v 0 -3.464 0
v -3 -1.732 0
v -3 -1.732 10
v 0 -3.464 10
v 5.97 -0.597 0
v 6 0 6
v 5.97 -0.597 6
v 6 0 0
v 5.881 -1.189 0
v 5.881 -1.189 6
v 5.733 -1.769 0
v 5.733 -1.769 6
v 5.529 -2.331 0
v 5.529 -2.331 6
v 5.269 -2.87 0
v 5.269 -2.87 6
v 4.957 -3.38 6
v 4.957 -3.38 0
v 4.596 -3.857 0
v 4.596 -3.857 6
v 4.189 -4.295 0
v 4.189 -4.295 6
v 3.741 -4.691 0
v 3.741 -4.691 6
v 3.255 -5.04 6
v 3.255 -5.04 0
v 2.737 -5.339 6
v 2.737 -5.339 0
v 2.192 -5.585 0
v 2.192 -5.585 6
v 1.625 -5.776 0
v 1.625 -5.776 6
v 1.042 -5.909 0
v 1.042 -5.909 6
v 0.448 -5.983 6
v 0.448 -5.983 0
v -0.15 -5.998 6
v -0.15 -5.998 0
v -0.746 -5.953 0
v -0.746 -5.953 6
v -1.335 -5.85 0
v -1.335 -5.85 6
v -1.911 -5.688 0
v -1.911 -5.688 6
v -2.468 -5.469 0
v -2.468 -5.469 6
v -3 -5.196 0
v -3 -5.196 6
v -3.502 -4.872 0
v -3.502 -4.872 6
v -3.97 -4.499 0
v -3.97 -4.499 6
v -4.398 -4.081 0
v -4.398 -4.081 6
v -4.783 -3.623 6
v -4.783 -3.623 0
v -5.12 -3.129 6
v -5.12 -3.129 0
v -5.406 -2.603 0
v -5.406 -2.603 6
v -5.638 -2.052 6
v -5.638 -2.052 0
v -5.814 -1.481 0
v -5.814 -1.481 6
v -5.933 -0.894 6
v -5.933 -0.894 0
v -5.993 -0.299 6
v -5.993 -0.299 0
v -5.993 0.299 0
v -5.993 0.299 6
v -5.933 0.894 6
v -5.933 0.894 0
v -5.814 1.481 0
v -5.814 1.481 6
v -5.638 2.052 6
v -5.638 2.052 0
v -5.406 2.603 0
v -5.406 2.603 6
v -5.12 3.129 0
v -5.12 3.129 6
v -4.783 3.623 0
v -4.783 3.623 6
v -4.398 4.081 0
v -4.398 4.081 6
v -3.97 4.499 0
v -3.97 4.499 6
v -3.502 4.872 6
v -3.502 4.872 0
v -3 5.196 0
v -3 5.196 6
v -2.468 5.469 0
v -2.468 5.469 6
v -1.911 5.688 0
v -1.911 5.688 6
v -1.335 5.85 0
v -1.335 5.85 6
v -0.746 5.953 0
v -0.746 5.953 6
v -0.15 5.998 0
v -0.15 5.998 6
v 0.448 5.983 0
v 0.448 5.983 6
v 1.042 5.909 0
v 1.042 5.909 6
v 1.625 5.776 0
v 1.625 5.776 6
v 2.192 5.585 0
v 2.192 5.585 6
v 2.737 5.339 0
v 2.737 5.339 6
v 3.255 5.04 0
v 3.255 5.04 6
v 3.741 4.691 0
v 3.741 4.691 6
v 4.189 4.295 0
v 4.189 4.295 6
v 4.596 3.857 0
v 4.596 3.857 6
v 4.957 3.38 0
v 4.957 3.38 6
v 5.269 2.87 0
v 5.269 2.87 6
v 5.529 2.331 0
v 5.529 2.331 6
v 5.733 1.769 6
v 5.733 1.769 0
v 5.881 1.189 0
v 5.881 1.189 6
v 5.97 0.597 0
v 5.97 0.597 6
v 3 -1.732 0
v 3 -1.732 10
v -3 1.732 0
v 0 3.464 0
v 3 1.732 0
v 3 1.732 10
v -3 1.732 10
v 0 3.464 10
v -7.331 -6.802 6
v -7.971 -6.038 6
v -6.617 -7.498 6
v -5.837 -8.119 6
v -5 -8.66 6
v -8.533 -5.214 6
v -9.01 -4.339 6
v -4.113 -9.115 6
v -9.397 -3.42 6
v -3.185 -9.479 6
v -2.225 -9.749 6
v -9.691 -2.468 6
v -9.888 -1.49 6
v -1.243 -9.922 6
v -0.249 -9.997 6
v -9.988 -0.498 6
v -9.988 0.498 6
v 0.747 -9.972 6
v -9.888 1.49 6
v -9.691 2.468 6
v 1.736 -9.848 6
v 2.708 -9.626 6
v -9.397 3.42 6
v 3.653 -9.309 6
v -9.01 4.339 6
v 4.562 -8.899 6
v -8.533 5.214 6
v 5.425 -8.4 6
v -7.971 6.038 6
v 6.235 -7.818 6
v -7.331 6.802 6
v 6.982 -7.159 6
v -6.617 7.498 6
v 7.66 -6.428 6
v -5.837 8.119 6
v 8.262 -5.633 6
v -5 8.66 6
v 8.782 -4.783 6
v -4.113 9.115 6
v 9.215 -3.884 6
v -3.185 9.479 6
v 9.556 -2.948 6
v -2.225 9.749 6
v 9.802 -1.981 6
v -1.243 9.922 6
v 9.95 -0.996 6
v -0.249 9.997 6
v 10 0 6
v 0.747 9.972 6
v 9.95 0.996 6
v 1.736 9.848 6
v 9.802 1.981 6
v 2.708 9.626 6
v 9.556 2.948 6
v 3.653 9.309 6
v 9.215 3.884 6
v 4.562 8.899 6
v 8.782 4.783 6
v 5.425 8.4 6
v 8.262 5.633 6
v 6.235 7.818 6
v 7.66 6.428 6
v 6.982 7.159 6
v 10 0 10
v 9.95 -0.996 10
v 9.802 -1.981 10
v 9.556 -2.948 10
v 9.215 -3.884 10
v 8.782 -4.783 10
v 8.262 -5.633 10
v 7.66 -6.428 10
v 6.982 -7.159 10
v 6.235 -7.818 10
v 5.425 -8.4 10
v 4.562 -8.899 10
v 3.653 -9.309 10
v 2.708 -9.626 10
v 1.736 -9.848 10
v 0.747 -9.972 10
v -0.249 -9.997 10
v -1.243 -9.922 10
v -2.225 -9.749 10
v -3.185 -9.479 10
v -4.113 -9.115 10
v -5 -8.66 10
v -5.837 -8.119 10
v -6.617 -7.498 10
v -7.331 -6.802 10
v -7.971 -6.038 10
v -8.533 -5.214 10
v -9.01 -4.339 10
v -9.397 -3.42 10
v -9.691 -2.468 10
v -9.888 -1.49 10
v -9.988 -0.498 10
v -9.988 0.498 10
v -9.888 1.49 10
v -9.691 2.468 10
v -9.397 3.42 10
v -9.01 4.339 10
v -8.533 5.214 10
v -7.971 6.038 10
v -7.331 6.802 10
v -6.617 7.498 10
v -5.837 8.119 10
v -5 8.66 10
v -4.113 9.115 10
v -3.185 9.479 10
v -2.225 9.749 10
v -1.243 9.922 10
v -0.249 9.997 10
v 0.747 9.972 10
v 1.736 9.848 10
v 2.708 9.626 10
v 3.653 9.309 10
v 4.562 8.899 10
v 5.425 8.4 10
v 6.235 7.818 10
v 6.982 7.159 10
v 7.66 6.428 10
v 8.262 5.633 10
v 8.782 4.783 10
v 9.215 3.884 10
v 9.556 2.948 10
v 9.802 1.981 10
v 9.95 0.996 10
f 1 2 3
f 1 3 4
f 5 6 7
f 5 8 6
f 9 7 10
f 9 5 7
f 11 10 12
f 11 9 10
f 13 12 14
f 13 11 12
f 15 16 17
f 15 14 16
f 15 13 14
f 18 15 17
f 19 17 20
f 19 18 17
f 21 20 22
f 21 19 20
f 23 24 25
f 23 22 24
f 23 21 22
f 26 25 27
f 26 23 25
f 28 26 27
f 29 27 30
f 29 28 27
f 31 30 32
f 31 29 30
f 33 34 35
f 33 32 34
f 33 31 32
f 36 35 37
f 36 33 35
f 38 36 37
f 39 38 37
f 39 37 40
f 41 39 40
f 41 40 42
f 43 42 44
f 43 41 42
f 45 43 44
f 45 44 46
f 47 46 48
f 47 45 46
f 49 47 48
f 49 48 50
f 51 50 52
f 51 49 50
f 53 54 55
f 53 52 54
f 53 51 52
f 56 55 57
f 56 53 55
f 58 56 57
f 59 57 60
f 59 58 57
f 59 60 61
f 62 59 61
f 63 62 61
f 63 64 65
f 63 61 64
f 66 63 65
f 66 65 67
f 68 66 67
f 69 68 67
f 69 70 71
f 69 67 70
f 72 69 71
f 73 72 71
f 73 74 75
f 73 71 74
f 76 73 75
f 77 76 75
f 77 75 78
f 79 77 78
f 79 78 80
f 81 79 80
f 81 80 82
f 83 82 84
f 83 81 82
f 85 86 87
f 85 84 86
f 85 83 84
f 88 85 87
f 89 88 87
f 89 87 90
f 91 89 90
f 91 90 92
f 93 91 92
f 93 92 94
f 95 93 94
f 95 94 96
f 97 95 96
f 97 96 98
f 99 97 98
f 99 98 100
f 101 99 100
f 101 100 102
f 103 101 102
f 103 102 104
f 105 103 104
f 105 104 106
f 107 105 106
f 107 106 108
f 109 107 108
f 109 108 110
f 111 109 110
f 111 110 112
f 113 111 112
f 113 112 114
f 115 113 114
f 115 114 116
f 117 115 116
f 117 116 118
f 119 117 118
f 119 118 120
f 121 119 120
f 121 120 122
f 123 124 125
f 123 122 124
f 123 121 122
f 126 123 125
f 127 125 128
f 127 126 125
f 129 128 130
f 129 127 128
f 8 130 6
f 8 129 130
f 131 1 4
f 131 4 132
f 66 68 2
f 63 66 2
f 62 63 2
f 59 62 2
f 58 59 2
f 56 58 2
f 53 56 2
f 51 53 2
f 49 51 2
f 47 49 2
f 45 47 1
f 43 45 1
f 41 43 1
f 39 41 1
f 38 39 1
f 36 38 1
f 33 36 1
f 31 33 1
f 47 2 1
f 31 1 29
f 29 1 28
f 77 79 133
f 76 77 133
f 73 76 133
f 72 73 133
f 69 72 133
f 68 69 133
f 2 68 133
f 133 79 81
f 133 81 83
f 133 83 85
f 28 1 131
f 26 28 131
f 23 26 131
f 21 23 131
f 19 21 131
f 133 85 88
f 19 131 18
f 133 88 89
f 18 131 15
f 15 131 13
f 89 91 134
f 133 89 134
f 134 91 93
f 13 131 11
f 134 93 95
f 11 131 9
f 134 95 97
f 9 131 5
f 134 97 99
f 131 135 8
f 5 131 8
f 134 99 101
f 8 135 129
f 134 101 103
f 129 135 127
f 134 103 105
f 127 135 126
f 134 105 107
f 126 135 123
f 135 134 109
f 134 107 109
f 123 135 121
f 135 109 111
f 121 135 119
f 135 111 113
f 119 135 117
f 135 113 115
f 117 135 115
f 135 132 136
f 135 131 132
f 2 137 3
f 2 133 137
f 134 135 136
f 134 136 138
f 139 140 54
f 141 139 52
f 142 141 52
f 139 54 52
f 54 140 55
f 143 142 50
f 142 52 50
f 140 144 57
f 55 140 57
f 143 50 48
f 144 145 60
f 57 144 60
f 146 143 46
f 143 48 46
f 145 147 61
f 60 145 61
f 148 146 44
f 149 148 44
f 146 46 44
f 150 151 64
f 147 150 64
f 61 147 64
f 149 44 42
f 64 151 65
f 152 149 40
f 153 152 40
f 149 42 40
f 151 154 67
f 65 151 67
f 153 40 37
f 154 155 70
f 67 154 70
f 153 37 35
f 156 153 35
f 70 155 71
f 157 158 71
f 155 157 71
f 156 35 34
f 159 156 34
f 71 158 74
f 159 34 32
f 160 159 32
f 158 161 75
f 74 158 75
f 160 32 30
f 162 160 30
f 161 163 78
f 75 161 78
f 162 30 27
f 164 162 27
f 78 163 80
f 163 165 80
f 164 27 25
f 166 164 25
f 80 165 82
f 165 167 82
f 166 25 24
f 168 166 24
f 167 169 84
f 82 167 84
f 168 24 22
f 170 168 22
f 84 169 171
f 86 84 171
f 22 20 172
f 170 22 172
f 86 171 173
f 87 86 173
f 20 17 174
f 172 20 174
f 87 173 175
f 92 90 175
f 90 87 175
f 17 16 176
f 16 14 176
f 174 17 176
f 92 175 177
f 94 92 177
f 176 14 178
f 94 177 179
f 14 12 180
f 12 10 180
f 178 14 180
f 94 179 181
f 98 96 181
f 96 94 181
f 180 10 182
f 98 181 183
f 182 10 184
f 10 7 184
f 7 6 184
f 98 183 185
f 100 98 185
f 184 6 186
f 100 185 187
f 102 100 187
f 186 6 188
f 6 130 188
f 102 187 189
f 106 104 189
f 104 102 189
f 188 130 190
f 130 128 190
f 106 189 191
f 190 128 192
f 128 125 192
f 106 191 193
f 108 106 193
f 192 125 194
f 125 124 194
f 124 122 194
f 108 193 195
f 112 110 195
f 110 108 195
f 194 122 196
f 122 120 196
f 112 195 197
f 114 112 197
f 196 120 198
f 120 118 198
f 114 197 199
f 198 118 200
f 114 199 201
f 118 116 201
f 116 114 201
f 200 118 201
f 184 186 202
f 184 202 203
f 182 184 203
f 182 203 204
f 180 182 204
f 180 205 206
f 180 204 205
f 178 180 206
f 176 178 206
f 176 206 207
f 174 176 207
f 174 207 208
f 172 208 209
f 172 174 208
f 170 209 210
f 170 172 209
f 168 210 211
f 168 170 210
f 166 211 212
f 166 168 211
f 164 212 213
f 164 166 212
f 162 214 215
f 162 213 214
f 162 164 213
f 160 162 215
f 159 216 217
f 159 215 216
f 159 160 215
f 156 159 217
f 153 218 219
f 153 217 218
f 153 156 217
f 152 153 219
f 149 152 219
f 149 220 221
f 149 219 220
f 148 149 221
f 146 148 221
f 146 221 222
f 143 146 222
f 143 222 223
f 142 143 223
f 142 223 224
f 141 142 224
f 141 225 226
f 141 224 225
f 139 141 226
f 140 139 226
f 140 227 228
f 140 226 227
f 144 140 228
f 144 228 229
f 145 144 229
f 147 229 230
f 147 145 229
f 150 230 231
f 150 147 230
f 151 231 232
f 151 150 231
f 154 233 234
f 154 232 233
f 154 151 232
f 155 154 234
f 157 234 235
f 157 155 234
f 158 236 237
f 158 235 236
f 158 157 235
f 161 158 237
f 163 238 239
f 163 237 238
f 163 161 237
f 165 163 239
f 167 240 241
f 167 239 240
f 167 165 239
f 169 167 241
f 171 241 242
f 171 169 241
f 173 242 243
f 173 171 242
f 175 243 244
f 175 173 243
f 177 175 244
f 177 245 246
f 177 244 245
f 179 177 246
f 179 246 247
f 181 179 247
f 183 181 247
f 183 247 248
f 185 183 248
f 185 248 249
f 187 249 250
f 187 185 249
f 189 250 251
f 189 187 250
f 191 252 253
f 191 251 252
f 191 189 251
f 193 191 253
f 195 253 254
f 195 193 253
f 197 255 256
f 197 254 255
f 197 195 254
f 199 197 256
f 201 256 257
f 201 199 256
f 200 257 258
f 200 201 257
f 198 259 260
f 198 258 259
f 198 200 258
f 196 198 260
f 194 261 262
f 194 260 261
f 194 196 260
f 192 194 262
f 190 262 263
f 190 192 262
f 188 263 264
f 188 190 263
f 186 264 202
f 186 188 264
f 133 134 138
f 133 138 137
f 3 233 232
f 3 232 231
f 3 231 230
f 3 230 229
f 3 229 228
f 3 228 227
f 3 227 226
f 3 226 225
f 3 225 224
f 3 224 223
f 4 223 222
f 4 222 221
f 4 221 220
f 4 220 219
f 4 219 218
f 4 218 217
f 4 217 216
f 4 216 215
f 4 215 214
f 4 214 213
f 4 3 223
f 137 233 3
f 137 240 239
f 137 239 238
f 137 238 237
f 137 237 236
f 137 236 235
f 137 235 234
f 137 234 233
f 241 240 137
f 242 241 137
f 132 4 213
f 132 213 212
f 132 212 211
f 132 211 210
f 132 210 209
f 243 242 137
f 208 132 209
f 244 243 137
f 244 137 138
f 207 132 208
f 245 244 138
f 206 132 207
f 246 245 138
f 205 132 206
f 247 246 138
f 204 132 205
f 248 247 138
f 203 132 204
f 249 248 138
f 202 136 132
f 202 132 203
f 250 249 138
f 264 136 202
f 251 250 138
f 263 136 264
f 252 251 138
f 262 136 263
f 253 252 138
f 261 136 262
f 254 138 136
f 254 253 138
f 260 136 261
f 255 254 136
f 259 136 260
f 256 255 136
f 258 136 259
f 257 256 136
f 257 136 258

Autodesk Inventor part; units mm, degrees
ref_plane "YZ Plane" through (0, 0, 0) normal (1, 0, 0) x (0, 1, 0)
ref_plane "XZ Plane" through (0, 0, 0) normal (0, 1, 0) x (-1, 0, 0)
ref_plane "XY Plane" through (0, 0, 0) normal (0, 0, 1) x (1, 0, 0)
sketch "Boceto1" plane through (0, 0, 0) normal (0, 0, 1) x (1, 0, 0)
  circle A0 centre (0, 0) radius 6
  dimension "d0" = 12
extrude "Extrusión1" add sketch "Boceto1" along normal blind 6
sketch "Boceto2" plane through (0, 0, 6) normal (0, 0, 1) x (1, 0, 0)
  circle A0 centre (0, 0) radius 10
  dimension "d3" = 20
extrude "Extrusión2" add sketch "Boceto2" along normal blind 4
sketch "Boceto3" plane through (0, 0, 0) normal (0, 0, -1) x (-1, 0, 0)
  line L0 (0, 3.4641) -> (3, 1.7321)
  line L1 (3, 1.7321) -> (3, -1.7321)
  line L2 (3, -1.7321) -> (0, -3.4641)
  line L3 (0, -3.4641) -> (-3, -1.7321)
  line L4 (-3, -1.7321) -> (-3, 1.7321)
  line L5 (-3, 1.7321) -> (0, 3.4641)
  point P0 (0, 0)
  point P1 (0, 0)
  point P2 (3, 0)
  dimension "d6" = 6
extrude "Extrusión3" cut sketch "Boceto3" against normal through all
properties part number "SoporteEje"
